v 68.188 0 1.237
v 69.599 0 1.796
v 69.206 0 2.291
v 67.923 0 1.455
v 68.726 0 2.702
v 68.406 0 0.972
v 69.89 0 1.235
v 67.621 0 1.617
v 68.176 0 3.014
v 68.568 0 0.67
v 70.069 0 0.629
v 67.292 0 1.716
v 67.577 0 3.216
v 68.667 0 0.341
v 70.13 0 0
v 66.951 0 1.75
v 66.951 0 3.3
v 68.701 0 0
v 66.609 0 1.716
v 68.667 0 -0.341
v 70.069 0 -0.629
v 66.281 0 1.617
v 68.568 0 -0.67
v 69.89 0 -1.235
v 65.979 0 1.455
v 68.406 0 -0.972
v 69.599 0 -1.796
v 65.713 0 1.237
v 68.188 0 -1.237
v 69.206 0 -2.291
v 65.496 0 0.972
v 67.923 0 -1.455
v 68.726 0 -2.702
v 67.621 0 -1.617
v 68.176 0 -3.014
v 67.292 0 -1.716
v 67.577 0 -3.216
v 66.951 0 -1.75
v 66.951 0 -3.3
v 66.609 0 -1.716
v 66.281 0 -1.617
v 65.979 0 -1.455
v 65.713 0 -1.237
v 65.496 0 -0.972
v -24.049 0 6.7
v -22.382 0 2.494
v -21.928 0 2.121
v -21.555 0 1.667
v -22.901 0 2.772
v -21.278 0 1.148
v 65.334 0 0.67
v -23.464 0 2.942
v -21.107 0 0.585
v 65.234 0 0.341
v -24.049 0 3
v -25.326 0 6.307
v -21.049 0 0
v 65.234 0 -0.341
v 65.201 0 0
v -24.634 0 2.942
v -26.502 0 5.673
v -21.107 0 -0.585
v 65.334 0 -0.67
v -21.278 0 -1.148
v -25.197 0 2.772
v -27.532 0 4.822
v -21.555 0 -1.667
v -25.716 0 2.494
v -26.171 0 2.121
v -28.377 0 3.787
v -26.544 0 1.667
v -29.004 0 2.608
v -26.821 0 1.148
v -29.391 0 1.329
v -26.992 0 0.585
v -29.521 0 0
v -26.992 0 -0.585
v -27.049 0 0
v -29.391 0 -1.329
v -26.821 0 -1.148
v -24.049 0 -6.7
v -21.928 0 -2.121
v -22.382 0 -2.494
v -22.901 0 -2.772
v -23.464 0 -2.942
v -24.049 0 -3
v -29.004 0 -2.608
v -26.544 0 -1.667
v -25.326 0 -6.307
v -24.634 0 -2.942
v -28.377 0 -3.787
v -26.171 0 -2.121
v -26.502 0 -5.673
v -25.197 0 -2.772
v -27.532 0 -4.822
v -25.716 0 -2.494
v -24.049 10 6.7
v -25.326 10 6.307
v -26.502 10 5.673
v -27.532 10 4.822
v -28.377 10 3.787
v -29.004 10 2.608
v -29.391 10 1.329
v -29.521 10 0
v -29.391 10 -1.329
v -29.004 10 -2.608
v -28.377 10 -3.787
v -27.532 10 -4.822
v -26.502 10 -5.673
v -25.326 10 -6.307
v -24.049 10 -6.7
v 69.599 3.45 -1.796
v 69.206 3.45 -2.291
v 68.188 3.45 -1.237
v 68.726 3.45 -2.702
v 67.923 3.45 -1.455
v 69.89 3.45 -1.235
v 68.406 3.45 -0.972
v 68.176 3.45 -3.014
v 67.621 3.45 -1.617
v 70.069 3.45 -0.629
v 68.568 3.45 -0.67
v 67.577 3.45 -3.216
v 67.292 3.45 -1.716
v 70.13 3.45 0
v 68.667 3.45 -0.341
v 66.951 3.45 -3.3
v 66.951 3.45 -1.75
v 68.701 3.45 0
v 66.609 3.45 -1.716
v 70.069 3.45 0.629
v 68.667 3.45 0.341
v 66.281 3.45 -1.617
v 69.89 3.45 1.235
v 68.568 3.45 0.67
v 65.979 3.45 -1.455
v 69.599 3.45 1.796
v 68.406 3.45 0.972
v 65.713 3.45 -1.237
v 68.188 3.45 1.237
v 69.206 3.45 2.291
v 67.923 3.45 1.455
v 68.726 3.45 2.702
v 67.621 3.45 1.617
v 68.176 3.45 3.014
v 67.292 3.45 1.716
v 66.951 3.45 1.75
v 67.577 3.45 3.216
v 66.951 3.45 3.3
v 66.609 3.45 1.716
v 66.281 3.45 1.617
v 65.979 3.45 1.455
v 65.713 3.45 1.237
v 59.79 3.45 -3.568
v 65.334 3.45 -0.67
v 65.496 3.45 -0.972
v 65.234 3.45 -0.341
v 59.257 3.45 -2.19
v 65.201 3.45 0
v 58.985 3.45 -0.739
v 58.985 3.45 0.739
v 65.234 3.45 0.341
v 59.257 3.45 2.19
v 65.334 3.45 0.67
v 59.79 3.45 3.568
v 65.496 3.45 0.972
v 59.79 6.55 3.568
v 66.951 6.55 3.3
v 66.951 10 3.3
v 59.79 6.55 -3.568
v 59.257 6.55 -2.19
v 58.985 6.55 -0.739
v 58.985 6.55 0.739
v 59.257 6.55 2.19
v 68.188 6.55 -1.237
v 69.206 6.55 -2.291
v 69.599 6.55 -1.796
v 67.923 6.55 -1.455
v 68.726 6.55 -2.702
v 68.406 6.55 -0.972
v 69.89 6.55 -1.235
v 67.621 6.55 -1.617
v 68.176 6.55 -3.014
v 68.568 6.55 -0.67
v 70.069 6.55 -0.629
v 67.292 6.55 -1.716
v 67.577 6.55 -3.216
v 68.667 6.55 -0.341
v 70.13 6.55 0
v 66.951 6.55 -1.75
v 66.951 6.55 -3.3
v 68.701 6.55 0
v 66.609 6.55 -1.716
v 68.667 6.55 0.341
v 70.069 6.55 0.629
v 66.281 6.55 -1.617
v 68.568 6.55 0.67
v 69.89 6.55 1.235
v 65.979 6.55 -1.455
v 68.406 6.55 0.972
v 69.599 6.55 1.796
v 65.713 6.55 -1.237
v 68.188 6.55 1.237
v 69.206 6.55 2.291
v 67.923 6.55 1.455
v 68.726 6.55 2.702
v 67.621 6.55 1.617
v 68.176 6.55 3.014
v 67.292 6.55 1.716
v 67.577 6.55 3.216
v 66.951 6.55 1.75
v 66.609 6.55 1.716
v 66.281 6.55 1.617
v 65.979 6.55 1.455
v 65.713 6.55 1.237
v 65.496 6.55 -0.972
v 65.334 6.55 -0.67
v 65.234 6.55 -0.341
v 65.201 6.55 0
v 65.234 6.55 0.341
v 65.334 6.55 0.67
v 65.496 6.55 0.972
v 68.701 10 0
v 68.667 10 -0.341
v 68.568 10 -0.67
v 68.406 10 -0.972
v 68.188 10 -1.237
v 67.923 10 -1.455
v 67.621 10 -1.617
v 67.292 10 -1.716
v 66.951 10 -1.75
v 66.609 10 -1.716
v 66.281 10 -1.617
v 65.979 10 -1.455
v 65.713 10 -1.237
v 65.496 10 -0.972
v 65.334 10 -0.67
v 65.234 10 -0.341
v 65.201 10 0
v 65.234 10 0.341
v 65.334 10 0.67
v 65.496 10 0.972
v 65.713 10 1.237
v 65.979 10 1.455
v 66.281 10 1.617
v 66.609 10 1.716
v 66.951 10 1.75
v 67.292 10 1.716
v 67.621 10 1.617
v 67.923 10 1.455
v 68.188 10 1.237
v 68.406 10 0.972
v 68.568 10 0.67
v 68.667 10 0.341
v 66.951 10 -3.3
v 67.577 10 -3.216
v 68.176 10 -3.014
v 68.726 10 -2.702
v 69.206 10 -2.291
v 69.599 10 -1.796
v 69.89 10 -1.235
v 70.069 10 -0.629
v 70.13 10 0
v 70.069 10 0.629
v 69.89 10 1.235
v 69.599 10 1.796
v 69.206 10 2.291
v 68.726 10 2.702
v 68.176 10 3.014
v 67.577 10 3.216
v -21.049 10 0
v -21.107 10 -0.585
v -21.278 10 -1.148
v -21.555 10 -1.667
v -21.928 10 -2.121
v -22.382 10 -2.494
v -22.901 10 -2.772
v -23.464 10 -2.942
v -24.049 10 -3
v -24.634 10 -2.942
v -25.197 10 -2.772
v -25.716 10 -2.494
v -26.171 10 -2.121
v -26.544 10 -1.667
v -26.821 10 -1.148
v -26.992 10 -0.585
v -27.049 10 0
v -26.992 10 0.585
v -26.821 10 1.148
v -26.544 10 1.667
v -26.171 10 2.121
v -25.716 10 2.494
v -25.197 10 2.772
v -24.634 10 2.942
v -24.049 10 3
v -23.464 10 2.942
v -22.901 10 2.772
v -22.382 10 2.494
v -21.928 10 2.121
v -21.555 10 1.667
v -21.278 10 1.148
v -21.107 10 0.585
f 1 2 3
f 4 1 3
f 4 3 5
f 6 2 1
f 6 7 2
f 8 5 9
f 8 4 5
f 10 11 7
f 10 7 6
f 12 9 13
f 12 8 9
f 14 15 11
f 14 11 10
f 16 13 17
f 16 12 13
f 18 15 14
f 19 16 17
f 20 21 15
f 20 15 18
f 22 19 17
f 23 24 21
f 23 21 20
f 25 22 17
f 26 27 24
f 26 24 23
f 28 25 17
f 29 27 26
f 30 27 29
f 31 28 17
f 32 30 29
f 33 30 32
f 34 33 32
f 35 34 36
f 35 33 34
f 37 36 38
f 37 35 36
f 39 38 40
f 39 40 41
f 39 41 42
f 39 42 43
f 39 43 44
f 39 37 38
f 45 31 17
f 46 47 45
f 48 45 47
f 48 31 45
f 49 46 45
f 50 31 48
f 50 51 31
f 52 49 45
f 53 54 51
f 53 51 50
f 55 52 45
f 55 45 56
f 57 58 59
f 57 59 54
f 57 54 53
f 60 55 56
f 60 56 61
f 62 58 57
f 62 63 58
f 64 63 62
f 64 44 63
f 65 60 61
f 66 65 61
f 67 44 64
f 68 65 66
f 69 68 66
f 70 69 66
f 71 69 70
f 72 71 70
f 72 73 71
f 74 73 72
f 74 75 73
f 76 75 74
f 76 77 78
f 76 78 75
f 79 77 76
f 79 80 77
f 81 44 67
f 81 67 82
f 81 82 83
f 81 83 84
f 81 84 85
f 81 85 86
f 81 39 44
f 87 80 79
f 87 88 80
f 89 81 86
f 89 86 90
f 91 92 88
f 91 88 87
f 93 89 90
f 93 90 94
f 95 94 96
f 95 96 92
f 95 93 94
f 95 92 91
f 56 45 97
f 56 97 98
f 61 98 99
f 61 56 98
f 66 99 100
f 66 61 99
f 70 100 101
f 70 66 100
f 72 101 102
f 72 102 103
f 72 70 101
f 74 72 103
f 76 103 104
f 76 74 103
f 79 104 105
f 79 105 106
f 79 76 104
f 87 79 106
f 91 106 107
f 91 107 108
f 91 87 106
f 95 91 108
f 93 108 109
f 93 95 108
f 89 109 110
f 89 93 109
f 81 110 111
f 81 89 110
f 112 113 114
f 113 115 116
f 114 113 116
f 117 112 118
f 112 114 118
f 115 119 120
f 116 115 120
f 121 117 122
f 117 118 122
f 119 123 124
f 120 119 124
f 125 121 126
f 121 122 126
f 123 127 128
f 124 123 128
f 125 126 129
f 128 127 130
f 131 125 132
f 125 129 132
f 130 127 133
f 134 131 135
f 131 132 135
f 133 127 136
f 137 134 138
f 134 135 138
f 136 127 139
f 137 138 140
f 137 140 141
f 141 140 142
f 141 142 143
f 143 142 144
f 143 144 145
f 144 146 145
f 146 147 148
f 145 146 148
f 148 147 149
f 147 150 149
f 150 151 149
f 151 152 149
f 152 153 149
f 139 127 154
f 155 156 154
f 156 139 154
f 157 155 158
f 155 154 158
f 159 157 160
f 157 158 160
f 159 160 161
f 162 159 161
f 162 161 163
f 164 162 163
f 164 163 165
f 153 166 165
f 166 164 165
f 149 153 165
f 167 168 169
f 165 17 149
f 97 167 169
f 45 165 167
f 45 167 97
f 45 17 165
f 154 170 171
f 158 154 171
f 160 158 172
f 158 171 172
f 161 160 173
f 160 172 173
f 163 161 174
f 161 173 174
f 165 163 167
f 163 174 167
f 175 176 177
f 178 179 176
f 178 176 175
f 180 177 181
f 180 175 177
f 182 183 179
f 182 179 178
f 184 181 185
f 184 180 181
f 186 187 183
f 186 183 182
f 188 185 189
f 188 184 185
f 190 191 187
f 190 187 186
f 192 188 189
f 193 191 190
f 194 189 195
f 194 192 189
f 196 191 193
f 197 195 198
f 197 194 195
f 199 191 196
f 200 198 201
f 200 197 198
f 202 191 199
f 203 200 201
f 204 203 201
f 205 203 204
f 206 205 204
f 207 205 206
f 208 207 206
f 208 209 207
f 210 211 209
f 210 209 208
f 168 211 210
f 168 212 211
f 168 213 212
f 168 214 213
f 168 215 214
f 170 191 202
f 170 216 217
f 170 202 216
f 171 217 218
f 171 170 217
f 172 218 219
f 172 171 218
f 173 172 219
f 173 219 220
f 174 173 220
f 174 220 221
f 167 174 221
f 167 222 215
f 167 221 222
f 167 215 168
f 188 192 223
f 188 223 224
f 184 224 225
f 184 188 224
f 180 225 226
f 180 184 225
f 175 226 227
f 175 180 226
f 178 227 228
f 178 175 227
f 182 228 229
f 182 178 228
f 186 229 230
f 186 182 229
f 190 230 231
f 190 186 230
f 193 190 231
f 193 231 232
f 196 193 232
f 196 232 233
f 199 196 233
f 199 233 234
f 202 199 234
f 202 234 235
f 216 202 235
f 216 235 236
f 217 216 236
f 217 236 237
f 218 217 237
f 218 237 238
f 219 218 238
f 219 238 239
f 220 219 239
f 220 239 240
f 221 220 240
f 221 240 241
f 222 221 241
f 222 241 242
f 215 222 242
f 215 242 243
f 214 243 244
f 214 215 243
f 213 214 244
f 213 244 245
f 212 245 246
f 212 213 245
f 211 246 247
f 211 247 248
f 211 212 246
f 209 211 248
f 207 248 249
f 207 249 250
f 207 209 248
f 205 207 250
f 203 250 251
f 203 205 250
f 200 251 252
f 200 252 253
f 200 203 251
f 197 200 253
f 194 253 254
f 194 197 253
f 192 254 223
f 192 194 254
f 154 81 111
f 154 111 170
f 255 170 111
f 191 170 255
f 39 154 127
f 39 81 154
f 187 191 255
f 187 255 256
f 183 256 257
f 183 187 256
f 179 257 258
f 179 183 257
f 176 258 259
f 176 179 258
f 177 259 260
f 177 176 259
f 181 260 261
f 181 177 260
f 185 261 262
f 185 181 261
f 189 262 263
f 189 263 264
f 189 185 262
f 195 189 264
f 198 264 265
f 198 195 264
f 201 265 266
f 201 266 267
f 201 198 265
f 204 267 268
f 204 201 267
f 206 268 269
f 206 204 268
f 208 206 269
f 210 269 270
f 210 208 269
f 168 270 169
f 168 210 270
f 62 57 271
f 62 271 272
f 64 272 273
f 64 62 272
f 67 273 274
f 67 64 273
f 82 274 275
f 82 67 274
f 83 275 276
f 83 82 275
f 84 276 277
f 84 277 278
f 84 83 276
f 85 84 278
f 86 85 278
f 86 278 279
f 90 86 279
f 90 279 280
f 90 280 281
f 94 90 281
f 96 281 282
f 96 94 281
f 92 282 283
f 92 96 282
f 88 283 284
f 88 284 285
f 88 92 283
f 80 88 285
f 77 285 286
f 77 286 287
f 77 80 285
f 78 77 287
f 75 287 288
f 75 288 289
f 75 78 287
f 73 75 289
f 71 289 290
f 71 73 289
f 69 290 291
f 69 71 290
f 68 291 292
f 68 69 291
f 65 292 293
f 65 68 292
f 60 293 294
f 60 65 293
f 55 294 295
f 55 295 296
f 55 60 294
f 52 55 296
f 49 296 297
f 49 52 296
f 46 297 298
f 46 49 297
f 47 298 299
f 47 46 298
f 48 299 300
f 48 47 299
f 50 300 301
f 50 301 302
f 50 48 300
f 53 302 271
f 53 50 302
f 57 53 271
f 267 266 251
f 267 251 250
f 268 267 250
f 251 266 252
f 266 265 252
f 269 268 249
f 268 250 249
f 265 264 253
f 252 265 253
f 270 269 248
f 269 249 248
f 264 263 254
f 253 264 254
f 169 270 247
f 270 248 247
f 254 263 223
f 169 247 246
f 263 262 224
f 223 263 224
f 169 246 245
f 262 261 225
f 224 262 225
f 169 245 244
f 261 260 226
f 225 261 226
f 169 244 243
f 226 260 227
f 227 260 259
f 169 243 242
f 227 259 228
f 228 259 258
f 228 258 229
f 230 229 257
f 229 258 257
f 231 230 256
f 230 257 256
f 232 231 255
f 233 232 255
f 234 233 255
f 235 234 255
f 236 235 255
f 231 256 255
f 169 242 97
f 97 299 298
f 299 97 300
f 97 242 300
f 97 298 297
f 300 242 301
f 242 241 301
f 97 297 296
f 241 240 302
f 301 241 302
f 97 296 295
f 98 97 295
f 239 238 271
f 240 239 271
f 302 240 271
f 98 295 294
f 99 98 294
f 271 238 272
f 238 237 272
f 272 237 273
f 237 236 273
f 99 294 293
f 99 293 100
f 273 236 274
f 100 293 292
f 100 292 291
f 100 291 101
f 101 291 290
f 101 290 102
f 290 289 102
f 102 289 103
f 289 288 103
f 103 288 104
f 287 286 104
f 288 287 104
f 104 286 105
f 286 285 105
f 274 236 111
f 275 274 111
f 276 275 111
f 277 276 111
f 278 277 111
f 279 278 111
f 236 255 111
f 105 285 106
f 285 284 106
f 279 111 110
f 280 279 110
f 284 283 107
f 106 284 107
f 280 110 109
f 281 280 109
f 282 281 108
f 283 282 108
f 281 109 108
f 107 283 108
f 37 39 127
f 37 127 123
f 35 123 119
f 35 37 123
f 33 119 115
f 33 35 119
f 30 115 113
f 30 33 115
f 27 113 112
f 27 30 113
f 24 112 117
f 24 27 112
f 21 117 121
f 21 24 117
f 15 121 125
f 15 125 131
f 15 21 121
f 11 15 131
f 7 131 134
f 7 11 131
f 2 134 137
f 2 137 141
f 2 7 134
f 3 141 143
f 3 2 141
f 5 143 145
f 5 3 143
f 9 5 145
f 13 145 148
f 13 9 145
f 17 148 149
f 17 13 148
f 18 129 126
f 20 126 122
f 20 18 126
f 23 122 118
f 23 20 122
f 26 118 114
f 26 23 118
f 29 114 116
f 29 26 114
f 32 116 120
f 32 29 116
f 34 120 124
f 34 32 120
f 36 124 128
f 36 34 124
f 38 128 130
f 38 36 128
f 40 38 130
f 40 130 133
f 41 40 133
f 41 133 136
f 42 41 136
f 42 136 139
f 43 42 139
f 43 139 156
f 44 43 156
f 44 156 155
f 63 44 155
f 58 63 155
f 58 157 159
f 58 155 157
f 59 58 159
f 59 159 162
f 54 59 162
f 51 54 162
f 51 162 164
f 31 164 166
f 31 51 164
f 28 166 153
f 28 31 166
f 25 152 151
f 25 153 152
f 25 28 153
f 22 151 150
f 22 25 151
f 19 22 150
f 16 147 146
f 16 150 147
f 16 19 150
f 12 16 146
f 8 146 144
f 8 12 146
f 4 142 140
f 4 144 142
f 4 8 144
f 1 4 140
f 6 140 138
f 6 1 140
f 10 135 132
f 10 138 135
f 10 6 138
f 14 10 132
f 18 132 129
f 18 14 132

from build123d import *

# Parameters (mm, degrees)
SKETCH1_R           = 1.75
SKETCH1_R_2         = 3
BOSS_EXTRUDE1_DEPTH = 10
SKETCH2_W           = 8
SKETCH2_H           = 3.1


with BuildPart() as part:
    # Sketch1 → Boss-Extrude1 (new body)
    with BuildSketch(Plane(origin=(0, 0, 0), x_dir=(1, 0, 0), z_dir=(0, 1, 0))):
        with BuildLine():
            Line((-24.049180328, 6.7), (66.950819672, 3.3))
            ThreePointArc((66.950819672, 3.3), (70.129825511, 0), (66.950819672, -3.3))
            Line((66.950819672, -3.3), (-24.049180328, -6.7))
            ThreePointArc((-24.049180328, -6.7), (-29.521356494, 0), (-24.049180328, 6.7))
        make_face()
        with Locations((66.950819672, 0)):
            Circle(SKETCH1_R, mode=Mode.SUBTRACT)
        with Locations((-24.049180328, 0)):
            Circle(SKETCH1_R_2, mode=Mode.SUBTRACT)
    extrude(amount=BOSS_EXTRUDE1_DEPTH)

    # Sketch2 → Cut-Revolve1 (revolve, cut)
    with BuildSketch(Plane(origin=(66.950819672, 0, 0), x_dir=(0, 0, -1), z_dir=(1, 0, 0))):
        with Locations((4, 5)):
            Rectangle(SKETCH2_W, SKETCH2_H)
    revolve(axis=Axis((66.950819672, 3.45, 0), (0, 1, 0)), mode=Mode.SUBTRACT)


solid = part.part
